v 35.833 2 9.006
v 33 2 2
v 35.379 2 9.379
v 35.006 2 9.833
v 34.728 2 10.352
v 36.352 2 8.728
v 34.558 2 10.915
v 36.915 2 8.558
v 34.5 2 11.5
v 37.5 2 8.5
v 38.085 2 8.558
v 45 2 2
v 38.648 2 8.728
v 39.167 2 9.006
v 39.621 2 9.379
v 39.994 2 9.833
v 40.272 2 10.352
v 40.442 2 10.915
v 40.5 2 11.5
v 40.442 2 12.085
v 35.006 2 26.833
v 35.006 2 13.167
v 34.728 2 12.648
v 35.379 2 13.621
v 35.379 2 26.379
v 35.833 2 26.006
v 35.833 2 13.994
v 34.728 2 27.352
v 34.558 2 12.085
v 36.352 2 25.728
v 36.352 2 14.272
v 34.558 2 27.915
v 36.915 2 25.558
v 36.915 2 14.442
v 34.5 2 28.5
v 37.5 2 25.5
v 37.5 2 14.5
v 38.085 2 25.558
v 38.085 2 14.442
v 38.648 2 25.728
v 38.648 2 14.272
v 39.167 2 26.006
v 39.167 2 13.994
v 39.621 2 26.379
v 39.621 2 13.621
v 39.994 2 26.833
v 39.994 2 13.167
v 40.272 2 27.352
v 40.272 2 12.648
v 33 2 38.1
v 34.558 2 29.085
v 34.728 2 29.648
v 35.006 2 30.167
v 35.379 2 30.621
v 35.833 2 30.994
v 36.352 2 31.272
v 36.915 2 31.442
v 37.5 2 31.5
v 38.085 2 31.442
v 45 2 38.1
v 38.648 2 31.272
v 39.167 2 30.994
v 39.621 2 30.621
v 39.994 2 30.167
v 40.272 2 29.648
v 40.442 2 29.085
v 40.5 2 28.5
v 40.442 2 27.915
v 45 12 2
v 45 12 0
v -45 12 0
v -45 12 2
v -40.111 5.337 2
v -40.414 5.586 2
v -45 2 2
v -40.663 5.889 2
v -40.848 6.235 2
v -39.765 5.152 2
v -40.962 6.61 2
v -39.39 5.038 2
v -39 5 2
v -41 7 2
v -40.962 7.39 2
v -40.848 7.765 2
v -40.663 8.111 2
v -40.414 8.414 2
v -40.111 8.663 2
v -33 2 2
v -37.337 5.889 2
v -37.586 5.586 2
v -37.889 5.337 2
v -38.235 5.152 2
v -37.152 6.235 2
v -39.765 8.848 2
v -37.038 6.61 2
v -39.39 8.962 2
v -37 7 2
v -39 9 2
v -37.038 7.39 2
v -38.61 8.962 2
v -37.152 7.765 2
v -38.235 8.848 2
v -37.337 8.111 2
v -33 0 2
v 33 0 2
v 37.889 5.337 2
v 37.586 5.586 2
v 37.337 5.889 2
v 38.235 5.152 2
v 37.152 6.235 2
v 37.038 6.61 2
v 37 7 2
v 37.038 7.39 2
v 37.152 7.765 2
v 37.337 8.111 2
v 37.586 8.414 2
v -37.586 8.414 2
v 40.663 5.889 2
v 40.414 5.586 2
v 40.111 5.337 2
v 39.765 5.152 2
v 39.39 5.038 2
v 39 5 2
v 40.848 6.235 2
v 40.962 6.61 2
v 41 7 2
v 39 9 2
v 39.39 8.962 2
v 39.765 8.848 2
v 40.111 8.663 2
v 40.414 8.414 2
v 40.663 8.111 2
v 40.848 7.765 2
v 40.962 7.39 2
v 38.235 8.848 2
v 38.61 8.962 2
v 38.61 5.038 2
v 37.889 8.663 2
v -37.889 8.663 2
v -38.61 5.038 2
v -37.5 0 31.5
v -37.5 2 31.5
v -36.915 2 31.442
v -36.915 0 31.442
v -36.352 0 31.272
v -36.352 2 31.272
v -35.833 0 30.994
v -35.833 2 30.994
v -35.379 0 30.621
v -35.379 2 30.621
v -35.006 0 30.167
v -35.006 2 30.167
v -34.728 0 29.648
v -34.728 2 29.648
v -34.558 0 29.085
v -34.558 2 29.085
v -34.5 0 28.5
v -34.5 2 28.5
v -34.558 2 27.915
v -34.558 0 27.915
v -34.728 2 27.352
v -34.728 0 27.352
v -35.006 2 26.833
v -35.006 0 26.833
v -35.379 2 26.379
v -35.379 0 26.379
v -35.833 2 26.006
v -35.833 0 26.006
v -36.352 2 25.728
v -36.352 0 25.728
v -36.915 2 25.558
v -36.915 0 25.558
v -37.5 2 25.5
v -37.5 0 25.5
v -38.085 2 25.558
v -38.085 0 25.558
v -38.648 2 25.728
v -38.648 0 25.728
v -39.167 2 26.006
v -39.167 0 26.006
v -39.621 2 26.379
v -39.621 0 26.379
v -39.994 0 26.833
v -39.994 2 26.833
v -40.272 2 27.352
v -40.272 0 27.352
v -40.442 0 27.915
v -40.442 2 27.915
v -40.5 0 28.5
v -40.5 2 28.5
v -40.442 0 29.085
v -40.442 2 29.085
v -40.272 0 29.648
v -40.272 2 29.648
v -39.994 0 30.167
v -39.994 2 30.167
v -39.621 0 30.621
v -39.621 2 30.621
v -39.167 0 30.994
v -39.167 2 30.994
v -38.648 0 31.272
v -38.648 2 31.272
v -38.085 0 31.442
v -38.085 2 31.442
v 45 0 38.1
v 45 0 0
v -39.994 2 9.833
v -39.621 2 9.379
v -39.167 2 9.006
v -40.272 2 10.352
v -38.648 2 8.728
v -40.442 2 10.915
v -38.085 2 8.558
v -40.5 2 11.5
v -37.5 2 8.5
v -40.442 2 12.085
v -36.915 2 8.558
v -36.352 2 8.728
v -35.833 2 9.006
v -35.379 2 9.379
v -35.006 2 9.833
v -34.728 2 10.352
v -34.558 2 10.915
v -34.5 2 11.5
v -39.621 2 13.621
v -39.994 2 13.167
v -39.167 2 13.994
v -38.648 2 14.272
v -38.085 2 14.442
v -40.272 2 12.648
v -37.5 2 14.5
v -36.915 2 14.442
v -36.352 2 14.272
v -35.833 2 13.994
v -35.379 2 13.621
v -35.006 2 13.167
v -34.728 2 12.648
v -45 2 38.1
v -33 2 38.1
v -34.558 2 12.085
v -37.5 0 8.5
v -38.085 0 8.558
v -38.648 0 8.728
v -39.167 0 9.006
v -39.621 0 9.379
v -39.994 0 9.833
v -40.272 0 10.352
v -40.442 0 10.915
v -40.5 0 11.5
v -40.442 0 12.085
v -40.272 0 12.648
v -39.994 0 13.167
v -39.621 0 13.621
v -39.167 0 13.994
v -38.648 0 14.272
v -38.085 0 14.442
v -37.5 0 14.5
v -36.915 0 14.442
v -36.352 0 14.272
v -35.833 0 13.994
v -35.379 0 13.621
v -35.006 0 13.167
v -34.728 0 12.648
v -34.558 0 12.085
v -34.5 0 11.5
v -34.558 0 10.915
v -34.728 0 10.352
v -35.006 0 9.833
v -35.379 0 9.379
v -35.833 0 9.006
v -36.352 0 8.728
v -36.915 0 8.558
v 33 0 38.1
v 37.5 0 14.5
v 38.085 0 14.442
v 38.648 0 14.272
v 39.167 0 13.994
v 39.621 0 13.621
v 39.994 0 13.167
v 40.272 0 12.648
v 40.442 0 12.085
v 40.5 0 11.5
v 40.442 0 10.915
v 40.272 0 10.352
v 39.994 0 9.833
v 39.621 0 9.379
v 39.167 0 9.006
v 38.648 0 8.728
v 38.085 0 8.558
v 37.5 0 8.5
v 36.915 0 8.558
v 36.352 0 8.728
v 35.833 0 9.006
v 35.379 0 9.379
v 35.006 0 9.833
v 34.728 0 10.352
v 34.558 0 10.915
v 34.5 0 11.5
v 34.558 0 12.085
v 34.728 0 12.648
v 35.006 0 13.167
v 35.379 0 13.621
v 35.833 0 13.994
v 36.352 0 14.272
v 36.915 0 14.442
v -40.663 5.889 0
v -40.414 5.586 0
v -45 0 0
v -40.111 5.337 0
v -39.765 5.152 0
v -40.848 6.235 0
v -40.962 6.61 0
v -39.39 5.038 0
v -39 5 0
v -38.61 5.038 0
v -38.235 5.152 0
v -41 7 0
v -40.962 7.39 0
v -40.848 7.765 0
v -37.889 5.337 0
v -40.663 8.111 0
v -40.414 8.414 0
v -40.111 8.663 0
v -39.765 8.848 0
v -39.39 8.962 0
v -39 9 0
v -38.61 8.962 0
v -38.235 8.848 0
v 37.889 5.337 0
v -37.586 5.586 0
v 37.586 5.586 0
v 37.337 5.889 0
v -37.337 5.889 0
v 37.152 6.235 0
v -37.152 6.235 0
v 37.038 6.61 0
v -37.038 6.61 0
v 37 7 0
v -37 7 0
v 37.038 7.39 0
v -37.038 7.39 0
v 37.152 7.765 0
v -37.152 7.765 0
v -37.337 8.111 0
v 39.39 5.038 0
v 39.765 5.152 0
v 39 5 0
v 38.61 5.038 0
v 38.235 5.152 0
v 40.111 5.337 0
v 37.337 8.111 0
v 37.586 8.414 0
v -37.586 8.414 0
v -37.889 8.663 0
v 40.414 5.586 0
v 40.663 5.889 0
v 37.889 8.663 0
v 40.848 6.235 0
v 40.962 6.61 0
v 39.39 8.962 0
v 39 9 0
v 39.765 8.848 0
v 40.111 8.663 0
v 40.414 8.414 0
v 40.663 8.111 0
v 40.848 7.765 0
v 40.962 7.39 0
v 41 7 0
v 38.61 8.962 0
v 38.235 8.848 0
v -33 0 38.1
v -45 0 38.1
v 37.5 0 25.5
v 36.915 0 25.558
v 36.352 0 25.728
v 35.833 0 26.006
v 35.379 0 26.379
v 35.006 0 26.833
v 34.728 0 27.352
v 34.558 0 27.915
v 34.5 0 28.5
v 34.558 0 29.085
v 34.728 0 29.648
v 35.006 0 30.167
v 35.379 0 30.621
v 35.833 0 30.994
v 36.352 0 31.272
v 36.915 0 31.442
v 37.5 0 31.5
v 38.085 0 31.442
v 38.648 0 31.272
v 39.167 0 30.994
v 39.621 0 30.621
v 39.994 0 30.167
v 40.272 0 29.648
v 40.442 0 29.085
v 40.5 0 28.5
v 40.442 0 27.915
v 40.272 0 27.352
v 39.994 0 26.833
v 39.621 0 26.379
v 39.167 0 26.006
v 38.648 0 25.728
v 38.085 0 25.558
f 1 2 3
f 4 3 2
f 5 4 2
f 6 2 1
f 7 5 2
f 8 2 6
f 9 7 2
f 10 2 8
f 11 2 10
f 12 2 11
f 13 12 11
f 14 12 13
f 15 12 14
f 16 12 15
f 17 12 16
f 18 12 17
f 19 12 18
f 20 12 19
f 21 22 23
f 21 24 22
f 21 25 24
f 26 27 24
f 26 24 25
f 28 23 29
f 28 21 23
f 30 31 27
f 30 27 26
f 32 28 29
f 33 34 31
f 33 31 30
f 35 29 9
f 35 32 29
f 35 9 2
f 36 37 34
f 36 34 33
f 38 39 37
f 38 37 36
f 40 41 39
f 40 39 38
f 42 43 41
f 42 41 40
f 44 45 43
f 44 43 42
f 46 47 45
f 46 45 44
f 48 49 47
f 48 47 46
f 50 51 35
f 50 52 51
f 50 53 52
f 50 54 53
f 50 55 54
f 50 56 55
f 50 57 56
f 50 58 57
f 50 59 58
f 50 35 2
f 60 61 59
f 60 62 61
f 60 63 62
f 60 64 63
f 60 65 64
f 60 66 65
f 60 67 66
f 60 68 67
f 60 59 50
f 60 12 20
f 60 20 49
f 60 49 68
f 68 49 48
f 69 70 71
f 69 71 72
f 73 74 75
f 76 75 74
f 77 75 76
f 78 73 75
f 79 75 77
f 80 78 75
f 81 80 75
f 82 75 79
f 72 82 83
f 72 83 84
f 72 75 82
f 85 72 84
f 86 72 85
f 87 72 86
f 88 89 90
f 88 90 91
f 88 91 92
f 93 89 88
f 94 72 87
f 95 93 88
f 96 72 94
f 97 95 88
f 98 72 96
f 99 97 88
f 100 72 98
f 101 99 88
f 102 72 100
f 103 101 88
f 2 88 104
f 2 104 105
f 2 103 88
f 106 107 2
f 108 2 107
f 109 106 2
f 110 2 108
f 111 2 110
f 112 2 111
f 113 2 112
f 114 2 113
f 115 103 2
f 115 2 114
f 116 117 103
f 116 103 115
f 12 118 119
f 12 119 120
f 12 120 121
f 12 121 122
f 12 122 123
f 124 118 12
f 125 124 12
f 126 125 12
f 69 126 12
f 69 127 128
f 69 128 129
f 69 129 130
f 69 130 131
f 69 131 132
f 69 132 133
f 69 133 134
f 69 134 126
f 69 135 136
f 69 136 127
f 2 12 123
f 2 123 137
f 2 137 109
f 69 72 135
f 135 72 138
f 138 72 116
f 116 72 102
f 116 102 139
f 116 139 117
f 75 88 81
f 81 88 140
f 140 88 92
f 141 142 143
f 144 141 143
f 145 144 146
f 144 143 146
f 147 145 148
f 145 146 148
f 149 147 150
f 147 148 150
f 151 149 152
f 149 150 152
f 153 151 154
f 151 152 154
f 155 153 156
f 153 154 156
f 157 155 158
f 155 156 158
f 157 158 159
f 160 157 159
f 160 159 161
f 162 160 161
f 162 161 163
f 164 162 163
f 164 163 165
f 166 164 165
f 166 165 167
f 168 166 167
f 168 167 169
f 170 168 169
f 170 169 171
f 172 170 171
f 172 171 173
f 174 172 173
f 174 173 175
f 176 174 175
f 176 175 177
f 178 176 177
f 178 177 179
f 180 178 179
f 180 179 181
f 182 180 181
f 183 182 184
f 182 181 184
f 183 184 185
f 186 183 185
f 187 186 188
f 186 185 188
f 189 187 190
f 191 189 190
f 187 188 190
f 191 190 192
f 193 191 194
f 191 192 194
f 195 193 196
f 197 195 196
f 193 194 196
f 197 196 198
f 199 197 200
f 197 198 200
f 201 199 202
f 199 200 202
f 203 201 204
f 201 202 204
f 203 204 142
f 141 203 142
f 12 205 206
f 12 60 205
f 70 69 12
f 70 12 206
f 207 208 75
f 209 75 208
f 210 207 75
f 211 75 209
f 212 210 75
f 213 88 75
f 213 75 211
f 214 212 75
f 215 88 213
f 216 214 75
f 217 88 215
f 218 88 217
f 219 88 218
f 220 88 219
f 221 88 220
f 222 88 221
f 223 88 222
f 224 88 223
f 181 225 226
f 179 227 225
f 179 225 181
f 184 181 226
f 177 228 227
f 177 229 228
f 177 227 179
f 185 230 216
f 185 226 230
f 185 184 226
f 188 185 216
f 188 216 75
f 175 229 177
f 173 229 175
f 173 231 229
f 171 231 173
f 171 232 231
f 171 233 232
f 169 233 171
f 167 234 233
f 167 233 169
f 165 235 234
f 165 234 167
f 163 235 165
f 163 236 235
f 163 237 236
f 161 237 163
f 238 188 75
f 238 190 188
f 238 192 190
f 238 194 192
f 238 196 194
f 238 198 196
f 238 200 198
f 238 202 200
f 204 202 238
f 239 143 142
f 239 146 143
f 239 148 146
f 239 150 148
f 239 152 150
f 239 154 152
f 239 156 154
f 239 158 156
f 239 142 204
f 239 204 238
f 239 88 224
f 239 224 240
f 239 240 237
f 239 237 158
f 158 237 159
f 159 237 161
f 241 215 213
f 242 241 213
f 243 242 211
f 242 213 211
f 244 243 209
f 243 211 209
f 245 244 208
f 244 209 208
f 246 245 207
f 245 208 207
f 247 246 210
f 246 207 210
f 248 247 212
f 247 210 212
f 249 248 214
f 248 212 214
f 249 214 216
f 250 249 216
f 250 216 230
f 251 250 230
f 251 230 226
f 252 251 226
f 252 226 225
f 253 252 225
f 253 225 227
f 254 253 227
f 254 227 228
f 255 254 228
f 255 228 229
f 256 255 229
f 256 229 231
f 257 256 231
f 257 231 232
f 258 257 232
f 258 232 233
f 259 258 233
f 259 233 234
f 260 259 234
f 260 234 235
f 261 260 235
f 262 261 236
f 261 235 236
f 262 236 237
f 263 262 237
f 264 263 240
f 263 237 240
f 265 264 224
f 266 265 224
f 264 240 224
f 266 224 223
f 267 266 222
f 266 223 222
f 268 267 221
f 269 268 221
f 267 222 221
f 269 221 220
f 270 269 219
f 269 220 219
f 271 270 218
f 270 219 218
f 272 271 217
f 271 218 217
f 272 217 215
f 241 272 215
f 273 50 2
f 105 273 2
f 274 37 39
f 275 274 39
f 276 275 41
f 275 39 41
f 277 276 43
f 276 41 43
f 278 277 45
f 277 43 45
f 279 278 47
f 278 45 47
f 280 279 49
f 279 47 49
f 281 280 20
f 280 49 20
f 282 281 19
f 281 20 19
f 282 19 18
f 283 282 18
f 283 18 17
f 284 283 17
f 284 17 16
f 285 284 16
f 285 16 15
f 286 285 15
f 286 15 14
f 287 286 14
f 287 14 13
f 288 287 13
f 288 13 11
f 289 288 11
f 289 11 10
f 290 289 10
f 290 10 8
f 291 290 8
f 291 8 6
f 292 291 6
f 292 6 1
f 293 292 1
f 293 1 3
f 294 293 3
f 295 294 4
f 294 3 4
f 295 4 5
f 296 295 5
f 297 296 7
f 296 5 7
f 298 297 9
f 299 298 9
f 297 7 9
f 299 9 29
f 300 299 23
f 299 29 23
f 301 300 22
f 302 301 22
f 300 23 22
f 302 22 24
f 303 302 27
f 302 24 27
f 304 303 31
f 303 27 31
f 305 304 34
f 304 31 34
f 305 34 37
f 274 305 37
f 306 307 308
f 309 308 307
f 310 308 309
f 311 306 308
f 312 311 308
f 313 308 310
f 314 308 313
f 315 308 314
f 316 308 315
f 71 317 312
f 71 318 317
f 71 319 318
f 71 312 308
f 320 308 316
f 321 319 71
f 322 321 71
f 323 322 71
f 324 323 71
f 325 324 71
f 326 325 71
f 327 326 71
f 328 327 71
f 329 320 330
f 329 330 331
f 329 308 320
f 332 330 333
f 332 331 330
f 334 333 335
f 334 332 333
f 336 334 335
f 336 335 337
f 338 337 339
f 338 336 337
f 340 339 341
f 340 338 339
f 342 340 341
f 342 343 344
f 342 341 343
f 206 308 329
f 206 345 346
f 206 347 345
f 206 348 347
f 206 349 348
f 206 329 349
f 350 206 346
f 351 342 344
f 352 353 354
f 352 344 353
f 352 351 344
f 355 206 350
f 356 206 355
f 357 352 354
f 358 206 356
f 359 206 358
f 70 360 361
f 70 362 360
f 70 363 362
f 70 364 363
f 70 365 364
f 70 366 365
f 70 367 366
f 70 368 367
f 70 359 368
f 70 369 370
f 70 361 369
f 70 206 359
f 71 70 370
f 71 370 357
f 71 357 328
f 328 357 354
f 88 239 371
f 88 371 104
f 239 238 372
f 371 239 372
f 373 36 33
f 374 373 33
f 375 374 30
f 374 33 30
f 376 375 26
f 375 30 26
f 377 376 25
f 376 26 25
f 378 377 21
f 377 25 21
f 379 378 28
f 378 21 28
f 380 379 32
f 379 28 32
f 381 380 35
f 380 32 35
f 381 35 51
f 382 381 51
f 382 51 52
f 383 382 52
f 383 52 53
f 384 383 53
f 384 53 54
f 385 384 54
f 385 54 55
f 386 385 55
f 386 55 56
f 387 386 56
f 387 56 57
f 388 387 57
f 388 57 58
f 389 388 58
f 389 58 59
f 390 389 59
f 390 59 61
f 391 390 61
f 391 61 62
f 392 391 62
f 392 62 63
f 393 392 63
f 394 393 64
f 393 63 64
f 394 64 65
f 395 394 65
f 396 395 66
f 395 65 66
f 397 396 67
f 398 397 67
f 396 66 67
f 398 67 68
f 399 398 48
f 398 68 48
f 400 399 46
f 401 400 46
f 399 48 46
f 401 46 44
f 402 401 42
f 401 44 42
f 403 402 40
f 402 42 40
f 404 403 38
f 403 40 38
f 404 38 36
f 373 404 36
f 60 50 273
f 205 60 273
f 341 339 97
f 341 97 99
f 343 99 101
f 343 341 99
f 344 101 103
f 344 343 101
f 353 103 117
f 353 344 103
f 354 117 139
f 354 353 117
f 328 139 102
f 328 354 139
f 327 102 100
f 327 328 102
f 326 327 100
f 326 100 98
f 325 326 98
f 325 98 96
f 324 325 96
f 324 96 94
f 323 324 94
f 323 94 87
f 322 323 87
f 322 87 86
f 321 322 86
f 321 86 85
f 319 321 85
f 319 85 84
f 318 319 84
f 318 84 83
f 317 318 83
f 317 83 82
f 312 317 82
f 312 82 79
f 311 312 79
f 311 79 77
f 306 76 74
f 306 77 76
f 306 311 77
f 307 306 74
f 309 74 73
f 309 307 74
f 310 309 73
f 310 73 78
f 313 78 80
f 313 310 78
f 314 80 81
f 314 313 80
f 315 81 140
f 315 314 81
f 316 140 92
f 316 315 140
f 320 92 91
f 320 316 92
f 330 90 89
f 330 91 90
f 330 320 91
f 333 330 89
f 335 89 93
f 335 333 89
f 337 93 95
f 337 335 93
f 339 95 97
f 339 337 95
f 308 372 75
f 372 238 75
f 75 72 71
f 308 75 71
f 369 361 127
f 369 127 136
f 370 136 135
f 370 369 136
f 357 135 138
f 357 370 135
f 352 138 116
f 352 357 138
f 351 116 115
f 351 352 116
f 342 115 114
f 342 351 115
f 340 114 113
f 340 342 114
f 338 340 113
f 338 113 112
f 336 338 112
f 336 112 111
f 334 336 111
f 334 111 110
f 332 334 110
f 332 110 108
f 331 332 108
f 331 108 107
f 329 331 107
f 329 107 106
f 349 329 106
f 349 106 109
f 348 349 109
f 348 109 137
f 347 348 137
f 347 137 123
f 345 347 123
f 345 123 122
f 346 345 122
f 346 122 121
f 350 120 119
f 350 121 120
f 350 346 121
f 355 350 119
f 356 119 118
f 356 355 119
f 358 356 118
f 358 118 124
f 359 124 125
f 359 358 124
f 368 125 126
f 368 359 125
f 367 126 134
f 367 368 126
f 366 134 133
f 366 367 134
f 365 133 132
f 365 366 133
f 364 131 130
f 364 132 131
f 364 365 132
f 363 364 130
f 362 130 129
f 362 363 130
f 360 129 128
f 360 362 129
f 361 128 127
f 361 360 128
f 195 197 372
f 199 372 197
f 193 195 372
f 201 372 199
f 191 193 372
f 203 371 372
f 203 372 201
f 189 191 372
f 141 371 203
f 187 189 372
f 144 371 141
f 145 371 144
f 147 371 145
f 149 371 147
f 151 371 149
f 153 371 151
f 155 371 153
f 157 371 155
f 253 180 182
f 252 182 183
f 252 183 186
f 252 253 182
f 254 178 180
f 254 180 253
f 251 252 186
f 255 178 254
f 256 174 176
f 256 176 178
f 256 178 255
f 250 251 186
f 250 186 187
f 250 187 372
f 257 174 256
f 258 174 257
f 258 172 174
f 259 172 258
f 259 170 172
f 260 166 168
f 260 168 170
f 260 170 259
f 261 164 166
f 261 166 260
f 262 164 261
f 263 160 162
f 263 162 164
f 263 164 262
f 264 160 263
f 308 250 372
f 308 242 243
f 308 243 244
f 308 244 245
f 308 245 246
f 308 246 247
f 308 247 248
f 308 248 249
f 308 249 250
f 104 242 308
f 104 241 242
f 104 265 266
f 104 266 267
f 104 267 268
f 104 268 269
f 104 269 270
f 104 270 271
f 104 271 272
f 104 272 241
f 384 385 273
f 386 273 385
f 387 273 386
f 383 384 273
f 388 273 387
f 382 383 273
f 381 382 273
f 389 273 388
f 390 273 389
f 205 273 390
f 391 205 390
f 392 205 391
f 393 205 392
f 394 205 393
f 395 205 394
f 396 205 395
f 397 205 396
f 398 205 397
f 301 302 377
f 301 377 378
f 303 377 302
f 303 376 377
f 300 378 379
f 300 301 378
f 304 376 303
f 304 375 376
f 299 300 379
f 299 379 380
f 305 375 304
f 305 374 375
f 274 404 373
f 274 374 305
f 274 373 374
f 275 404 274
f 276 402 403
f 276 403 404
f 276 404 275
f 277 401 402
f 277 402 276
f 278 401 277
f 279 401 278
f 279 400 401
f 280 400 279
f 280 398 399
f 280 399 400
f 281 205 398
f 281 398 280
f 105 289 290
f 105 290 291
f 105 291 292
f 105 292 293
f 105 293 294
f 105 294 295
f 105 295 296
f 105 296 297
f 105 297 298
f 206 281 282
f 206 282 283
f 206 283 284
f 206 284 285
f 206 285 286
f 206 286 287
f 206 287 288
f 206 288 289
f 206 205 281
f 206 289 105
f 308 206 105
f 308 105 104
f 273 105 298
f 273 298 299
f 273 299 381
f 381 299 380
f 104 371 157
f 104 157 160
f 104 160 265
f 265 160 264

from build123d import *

# Parameters (mm, degrees)
BOSS_EXTRUDE1_DEPTH     = 45
SKETCH2_R               = 3
SKETCH2_W               = 66
SKETCH2_H               = 48.8
CUT_EXTRUDE1_DEPTH      = 60.804765696
CUT_EXTRUDE2_DEPTH      = 59.92546139
CUT_EXTRUDE2_DEPTH_BACK = 59.92546139
SKETCH3_R               = 2


with BuildPart() as part:
    # Sketch1 → Boss-Extrude1 (new, symmetric)
    with BuildSketch(Plane(origin=(0, 0, 0), x_dir=(0, 0, -1), z_dir=(1, 0, 0))):
        Polygon((-38.1, 0), (0, 0), (0, 12), (-2, 12), (-2, 2), (-38.1, 2), align=None)
    extrude(amount=BOSS_EXTRUDE1_DEPTH, both=True)

    # Sketch2 → Cut-Extrude1 (cut, through all)
    with BuildSketch(Plane(origin=(0, 2, 0), x_dir=(1, 0, 0), z_dir=(0, 1, 0))):
        with Locations(Location((37.5, -11.5, 0), (0, 0, 270))):
            Circle(SKETCH2_R)
        with Locations(Location((37.5, -28.5, 0), (0, 0, 90))):
            Circle(SKETCH2_R)
        with Locations(Location((-37.5, -11.5, 0), (0, 0, 90))):
            Circle(SKETCH2_R)
        with Locations(Location((-37.5, -28.5, 0), (0, 0, 270))):
            Circle(SKETCH2_R)
        with Locations((0, -26.4)):
            Rectangle(SKETCH2_W, SKETCH2_H)
    extrude(amount=-CUT_EXTRUDE1_DEPTH, mode=Mode.SUBTRACT)

    # Sketch3 → Cut-Extrude2 (cut, two sides: drawn at the far end of the back side and taken through both)
    with BuildSketch(Plane.XY.offset(2).offset(-CUT_EXTRUDE2_DEPTH_BACK)):
        with Locations((-39, 7)):
            Circle(SKETCH3_R)
        with Locations(Location((39, 7, 0), (0, 0, 90))):
            Circle(SKETCH3_R)
    extrude(amount=CUT_EXTRUDE2_DEPTH + CUT_EXTRUDE2_DEPTH_BACK, mode=Mode.SUBTRACT)


solid = part.part
